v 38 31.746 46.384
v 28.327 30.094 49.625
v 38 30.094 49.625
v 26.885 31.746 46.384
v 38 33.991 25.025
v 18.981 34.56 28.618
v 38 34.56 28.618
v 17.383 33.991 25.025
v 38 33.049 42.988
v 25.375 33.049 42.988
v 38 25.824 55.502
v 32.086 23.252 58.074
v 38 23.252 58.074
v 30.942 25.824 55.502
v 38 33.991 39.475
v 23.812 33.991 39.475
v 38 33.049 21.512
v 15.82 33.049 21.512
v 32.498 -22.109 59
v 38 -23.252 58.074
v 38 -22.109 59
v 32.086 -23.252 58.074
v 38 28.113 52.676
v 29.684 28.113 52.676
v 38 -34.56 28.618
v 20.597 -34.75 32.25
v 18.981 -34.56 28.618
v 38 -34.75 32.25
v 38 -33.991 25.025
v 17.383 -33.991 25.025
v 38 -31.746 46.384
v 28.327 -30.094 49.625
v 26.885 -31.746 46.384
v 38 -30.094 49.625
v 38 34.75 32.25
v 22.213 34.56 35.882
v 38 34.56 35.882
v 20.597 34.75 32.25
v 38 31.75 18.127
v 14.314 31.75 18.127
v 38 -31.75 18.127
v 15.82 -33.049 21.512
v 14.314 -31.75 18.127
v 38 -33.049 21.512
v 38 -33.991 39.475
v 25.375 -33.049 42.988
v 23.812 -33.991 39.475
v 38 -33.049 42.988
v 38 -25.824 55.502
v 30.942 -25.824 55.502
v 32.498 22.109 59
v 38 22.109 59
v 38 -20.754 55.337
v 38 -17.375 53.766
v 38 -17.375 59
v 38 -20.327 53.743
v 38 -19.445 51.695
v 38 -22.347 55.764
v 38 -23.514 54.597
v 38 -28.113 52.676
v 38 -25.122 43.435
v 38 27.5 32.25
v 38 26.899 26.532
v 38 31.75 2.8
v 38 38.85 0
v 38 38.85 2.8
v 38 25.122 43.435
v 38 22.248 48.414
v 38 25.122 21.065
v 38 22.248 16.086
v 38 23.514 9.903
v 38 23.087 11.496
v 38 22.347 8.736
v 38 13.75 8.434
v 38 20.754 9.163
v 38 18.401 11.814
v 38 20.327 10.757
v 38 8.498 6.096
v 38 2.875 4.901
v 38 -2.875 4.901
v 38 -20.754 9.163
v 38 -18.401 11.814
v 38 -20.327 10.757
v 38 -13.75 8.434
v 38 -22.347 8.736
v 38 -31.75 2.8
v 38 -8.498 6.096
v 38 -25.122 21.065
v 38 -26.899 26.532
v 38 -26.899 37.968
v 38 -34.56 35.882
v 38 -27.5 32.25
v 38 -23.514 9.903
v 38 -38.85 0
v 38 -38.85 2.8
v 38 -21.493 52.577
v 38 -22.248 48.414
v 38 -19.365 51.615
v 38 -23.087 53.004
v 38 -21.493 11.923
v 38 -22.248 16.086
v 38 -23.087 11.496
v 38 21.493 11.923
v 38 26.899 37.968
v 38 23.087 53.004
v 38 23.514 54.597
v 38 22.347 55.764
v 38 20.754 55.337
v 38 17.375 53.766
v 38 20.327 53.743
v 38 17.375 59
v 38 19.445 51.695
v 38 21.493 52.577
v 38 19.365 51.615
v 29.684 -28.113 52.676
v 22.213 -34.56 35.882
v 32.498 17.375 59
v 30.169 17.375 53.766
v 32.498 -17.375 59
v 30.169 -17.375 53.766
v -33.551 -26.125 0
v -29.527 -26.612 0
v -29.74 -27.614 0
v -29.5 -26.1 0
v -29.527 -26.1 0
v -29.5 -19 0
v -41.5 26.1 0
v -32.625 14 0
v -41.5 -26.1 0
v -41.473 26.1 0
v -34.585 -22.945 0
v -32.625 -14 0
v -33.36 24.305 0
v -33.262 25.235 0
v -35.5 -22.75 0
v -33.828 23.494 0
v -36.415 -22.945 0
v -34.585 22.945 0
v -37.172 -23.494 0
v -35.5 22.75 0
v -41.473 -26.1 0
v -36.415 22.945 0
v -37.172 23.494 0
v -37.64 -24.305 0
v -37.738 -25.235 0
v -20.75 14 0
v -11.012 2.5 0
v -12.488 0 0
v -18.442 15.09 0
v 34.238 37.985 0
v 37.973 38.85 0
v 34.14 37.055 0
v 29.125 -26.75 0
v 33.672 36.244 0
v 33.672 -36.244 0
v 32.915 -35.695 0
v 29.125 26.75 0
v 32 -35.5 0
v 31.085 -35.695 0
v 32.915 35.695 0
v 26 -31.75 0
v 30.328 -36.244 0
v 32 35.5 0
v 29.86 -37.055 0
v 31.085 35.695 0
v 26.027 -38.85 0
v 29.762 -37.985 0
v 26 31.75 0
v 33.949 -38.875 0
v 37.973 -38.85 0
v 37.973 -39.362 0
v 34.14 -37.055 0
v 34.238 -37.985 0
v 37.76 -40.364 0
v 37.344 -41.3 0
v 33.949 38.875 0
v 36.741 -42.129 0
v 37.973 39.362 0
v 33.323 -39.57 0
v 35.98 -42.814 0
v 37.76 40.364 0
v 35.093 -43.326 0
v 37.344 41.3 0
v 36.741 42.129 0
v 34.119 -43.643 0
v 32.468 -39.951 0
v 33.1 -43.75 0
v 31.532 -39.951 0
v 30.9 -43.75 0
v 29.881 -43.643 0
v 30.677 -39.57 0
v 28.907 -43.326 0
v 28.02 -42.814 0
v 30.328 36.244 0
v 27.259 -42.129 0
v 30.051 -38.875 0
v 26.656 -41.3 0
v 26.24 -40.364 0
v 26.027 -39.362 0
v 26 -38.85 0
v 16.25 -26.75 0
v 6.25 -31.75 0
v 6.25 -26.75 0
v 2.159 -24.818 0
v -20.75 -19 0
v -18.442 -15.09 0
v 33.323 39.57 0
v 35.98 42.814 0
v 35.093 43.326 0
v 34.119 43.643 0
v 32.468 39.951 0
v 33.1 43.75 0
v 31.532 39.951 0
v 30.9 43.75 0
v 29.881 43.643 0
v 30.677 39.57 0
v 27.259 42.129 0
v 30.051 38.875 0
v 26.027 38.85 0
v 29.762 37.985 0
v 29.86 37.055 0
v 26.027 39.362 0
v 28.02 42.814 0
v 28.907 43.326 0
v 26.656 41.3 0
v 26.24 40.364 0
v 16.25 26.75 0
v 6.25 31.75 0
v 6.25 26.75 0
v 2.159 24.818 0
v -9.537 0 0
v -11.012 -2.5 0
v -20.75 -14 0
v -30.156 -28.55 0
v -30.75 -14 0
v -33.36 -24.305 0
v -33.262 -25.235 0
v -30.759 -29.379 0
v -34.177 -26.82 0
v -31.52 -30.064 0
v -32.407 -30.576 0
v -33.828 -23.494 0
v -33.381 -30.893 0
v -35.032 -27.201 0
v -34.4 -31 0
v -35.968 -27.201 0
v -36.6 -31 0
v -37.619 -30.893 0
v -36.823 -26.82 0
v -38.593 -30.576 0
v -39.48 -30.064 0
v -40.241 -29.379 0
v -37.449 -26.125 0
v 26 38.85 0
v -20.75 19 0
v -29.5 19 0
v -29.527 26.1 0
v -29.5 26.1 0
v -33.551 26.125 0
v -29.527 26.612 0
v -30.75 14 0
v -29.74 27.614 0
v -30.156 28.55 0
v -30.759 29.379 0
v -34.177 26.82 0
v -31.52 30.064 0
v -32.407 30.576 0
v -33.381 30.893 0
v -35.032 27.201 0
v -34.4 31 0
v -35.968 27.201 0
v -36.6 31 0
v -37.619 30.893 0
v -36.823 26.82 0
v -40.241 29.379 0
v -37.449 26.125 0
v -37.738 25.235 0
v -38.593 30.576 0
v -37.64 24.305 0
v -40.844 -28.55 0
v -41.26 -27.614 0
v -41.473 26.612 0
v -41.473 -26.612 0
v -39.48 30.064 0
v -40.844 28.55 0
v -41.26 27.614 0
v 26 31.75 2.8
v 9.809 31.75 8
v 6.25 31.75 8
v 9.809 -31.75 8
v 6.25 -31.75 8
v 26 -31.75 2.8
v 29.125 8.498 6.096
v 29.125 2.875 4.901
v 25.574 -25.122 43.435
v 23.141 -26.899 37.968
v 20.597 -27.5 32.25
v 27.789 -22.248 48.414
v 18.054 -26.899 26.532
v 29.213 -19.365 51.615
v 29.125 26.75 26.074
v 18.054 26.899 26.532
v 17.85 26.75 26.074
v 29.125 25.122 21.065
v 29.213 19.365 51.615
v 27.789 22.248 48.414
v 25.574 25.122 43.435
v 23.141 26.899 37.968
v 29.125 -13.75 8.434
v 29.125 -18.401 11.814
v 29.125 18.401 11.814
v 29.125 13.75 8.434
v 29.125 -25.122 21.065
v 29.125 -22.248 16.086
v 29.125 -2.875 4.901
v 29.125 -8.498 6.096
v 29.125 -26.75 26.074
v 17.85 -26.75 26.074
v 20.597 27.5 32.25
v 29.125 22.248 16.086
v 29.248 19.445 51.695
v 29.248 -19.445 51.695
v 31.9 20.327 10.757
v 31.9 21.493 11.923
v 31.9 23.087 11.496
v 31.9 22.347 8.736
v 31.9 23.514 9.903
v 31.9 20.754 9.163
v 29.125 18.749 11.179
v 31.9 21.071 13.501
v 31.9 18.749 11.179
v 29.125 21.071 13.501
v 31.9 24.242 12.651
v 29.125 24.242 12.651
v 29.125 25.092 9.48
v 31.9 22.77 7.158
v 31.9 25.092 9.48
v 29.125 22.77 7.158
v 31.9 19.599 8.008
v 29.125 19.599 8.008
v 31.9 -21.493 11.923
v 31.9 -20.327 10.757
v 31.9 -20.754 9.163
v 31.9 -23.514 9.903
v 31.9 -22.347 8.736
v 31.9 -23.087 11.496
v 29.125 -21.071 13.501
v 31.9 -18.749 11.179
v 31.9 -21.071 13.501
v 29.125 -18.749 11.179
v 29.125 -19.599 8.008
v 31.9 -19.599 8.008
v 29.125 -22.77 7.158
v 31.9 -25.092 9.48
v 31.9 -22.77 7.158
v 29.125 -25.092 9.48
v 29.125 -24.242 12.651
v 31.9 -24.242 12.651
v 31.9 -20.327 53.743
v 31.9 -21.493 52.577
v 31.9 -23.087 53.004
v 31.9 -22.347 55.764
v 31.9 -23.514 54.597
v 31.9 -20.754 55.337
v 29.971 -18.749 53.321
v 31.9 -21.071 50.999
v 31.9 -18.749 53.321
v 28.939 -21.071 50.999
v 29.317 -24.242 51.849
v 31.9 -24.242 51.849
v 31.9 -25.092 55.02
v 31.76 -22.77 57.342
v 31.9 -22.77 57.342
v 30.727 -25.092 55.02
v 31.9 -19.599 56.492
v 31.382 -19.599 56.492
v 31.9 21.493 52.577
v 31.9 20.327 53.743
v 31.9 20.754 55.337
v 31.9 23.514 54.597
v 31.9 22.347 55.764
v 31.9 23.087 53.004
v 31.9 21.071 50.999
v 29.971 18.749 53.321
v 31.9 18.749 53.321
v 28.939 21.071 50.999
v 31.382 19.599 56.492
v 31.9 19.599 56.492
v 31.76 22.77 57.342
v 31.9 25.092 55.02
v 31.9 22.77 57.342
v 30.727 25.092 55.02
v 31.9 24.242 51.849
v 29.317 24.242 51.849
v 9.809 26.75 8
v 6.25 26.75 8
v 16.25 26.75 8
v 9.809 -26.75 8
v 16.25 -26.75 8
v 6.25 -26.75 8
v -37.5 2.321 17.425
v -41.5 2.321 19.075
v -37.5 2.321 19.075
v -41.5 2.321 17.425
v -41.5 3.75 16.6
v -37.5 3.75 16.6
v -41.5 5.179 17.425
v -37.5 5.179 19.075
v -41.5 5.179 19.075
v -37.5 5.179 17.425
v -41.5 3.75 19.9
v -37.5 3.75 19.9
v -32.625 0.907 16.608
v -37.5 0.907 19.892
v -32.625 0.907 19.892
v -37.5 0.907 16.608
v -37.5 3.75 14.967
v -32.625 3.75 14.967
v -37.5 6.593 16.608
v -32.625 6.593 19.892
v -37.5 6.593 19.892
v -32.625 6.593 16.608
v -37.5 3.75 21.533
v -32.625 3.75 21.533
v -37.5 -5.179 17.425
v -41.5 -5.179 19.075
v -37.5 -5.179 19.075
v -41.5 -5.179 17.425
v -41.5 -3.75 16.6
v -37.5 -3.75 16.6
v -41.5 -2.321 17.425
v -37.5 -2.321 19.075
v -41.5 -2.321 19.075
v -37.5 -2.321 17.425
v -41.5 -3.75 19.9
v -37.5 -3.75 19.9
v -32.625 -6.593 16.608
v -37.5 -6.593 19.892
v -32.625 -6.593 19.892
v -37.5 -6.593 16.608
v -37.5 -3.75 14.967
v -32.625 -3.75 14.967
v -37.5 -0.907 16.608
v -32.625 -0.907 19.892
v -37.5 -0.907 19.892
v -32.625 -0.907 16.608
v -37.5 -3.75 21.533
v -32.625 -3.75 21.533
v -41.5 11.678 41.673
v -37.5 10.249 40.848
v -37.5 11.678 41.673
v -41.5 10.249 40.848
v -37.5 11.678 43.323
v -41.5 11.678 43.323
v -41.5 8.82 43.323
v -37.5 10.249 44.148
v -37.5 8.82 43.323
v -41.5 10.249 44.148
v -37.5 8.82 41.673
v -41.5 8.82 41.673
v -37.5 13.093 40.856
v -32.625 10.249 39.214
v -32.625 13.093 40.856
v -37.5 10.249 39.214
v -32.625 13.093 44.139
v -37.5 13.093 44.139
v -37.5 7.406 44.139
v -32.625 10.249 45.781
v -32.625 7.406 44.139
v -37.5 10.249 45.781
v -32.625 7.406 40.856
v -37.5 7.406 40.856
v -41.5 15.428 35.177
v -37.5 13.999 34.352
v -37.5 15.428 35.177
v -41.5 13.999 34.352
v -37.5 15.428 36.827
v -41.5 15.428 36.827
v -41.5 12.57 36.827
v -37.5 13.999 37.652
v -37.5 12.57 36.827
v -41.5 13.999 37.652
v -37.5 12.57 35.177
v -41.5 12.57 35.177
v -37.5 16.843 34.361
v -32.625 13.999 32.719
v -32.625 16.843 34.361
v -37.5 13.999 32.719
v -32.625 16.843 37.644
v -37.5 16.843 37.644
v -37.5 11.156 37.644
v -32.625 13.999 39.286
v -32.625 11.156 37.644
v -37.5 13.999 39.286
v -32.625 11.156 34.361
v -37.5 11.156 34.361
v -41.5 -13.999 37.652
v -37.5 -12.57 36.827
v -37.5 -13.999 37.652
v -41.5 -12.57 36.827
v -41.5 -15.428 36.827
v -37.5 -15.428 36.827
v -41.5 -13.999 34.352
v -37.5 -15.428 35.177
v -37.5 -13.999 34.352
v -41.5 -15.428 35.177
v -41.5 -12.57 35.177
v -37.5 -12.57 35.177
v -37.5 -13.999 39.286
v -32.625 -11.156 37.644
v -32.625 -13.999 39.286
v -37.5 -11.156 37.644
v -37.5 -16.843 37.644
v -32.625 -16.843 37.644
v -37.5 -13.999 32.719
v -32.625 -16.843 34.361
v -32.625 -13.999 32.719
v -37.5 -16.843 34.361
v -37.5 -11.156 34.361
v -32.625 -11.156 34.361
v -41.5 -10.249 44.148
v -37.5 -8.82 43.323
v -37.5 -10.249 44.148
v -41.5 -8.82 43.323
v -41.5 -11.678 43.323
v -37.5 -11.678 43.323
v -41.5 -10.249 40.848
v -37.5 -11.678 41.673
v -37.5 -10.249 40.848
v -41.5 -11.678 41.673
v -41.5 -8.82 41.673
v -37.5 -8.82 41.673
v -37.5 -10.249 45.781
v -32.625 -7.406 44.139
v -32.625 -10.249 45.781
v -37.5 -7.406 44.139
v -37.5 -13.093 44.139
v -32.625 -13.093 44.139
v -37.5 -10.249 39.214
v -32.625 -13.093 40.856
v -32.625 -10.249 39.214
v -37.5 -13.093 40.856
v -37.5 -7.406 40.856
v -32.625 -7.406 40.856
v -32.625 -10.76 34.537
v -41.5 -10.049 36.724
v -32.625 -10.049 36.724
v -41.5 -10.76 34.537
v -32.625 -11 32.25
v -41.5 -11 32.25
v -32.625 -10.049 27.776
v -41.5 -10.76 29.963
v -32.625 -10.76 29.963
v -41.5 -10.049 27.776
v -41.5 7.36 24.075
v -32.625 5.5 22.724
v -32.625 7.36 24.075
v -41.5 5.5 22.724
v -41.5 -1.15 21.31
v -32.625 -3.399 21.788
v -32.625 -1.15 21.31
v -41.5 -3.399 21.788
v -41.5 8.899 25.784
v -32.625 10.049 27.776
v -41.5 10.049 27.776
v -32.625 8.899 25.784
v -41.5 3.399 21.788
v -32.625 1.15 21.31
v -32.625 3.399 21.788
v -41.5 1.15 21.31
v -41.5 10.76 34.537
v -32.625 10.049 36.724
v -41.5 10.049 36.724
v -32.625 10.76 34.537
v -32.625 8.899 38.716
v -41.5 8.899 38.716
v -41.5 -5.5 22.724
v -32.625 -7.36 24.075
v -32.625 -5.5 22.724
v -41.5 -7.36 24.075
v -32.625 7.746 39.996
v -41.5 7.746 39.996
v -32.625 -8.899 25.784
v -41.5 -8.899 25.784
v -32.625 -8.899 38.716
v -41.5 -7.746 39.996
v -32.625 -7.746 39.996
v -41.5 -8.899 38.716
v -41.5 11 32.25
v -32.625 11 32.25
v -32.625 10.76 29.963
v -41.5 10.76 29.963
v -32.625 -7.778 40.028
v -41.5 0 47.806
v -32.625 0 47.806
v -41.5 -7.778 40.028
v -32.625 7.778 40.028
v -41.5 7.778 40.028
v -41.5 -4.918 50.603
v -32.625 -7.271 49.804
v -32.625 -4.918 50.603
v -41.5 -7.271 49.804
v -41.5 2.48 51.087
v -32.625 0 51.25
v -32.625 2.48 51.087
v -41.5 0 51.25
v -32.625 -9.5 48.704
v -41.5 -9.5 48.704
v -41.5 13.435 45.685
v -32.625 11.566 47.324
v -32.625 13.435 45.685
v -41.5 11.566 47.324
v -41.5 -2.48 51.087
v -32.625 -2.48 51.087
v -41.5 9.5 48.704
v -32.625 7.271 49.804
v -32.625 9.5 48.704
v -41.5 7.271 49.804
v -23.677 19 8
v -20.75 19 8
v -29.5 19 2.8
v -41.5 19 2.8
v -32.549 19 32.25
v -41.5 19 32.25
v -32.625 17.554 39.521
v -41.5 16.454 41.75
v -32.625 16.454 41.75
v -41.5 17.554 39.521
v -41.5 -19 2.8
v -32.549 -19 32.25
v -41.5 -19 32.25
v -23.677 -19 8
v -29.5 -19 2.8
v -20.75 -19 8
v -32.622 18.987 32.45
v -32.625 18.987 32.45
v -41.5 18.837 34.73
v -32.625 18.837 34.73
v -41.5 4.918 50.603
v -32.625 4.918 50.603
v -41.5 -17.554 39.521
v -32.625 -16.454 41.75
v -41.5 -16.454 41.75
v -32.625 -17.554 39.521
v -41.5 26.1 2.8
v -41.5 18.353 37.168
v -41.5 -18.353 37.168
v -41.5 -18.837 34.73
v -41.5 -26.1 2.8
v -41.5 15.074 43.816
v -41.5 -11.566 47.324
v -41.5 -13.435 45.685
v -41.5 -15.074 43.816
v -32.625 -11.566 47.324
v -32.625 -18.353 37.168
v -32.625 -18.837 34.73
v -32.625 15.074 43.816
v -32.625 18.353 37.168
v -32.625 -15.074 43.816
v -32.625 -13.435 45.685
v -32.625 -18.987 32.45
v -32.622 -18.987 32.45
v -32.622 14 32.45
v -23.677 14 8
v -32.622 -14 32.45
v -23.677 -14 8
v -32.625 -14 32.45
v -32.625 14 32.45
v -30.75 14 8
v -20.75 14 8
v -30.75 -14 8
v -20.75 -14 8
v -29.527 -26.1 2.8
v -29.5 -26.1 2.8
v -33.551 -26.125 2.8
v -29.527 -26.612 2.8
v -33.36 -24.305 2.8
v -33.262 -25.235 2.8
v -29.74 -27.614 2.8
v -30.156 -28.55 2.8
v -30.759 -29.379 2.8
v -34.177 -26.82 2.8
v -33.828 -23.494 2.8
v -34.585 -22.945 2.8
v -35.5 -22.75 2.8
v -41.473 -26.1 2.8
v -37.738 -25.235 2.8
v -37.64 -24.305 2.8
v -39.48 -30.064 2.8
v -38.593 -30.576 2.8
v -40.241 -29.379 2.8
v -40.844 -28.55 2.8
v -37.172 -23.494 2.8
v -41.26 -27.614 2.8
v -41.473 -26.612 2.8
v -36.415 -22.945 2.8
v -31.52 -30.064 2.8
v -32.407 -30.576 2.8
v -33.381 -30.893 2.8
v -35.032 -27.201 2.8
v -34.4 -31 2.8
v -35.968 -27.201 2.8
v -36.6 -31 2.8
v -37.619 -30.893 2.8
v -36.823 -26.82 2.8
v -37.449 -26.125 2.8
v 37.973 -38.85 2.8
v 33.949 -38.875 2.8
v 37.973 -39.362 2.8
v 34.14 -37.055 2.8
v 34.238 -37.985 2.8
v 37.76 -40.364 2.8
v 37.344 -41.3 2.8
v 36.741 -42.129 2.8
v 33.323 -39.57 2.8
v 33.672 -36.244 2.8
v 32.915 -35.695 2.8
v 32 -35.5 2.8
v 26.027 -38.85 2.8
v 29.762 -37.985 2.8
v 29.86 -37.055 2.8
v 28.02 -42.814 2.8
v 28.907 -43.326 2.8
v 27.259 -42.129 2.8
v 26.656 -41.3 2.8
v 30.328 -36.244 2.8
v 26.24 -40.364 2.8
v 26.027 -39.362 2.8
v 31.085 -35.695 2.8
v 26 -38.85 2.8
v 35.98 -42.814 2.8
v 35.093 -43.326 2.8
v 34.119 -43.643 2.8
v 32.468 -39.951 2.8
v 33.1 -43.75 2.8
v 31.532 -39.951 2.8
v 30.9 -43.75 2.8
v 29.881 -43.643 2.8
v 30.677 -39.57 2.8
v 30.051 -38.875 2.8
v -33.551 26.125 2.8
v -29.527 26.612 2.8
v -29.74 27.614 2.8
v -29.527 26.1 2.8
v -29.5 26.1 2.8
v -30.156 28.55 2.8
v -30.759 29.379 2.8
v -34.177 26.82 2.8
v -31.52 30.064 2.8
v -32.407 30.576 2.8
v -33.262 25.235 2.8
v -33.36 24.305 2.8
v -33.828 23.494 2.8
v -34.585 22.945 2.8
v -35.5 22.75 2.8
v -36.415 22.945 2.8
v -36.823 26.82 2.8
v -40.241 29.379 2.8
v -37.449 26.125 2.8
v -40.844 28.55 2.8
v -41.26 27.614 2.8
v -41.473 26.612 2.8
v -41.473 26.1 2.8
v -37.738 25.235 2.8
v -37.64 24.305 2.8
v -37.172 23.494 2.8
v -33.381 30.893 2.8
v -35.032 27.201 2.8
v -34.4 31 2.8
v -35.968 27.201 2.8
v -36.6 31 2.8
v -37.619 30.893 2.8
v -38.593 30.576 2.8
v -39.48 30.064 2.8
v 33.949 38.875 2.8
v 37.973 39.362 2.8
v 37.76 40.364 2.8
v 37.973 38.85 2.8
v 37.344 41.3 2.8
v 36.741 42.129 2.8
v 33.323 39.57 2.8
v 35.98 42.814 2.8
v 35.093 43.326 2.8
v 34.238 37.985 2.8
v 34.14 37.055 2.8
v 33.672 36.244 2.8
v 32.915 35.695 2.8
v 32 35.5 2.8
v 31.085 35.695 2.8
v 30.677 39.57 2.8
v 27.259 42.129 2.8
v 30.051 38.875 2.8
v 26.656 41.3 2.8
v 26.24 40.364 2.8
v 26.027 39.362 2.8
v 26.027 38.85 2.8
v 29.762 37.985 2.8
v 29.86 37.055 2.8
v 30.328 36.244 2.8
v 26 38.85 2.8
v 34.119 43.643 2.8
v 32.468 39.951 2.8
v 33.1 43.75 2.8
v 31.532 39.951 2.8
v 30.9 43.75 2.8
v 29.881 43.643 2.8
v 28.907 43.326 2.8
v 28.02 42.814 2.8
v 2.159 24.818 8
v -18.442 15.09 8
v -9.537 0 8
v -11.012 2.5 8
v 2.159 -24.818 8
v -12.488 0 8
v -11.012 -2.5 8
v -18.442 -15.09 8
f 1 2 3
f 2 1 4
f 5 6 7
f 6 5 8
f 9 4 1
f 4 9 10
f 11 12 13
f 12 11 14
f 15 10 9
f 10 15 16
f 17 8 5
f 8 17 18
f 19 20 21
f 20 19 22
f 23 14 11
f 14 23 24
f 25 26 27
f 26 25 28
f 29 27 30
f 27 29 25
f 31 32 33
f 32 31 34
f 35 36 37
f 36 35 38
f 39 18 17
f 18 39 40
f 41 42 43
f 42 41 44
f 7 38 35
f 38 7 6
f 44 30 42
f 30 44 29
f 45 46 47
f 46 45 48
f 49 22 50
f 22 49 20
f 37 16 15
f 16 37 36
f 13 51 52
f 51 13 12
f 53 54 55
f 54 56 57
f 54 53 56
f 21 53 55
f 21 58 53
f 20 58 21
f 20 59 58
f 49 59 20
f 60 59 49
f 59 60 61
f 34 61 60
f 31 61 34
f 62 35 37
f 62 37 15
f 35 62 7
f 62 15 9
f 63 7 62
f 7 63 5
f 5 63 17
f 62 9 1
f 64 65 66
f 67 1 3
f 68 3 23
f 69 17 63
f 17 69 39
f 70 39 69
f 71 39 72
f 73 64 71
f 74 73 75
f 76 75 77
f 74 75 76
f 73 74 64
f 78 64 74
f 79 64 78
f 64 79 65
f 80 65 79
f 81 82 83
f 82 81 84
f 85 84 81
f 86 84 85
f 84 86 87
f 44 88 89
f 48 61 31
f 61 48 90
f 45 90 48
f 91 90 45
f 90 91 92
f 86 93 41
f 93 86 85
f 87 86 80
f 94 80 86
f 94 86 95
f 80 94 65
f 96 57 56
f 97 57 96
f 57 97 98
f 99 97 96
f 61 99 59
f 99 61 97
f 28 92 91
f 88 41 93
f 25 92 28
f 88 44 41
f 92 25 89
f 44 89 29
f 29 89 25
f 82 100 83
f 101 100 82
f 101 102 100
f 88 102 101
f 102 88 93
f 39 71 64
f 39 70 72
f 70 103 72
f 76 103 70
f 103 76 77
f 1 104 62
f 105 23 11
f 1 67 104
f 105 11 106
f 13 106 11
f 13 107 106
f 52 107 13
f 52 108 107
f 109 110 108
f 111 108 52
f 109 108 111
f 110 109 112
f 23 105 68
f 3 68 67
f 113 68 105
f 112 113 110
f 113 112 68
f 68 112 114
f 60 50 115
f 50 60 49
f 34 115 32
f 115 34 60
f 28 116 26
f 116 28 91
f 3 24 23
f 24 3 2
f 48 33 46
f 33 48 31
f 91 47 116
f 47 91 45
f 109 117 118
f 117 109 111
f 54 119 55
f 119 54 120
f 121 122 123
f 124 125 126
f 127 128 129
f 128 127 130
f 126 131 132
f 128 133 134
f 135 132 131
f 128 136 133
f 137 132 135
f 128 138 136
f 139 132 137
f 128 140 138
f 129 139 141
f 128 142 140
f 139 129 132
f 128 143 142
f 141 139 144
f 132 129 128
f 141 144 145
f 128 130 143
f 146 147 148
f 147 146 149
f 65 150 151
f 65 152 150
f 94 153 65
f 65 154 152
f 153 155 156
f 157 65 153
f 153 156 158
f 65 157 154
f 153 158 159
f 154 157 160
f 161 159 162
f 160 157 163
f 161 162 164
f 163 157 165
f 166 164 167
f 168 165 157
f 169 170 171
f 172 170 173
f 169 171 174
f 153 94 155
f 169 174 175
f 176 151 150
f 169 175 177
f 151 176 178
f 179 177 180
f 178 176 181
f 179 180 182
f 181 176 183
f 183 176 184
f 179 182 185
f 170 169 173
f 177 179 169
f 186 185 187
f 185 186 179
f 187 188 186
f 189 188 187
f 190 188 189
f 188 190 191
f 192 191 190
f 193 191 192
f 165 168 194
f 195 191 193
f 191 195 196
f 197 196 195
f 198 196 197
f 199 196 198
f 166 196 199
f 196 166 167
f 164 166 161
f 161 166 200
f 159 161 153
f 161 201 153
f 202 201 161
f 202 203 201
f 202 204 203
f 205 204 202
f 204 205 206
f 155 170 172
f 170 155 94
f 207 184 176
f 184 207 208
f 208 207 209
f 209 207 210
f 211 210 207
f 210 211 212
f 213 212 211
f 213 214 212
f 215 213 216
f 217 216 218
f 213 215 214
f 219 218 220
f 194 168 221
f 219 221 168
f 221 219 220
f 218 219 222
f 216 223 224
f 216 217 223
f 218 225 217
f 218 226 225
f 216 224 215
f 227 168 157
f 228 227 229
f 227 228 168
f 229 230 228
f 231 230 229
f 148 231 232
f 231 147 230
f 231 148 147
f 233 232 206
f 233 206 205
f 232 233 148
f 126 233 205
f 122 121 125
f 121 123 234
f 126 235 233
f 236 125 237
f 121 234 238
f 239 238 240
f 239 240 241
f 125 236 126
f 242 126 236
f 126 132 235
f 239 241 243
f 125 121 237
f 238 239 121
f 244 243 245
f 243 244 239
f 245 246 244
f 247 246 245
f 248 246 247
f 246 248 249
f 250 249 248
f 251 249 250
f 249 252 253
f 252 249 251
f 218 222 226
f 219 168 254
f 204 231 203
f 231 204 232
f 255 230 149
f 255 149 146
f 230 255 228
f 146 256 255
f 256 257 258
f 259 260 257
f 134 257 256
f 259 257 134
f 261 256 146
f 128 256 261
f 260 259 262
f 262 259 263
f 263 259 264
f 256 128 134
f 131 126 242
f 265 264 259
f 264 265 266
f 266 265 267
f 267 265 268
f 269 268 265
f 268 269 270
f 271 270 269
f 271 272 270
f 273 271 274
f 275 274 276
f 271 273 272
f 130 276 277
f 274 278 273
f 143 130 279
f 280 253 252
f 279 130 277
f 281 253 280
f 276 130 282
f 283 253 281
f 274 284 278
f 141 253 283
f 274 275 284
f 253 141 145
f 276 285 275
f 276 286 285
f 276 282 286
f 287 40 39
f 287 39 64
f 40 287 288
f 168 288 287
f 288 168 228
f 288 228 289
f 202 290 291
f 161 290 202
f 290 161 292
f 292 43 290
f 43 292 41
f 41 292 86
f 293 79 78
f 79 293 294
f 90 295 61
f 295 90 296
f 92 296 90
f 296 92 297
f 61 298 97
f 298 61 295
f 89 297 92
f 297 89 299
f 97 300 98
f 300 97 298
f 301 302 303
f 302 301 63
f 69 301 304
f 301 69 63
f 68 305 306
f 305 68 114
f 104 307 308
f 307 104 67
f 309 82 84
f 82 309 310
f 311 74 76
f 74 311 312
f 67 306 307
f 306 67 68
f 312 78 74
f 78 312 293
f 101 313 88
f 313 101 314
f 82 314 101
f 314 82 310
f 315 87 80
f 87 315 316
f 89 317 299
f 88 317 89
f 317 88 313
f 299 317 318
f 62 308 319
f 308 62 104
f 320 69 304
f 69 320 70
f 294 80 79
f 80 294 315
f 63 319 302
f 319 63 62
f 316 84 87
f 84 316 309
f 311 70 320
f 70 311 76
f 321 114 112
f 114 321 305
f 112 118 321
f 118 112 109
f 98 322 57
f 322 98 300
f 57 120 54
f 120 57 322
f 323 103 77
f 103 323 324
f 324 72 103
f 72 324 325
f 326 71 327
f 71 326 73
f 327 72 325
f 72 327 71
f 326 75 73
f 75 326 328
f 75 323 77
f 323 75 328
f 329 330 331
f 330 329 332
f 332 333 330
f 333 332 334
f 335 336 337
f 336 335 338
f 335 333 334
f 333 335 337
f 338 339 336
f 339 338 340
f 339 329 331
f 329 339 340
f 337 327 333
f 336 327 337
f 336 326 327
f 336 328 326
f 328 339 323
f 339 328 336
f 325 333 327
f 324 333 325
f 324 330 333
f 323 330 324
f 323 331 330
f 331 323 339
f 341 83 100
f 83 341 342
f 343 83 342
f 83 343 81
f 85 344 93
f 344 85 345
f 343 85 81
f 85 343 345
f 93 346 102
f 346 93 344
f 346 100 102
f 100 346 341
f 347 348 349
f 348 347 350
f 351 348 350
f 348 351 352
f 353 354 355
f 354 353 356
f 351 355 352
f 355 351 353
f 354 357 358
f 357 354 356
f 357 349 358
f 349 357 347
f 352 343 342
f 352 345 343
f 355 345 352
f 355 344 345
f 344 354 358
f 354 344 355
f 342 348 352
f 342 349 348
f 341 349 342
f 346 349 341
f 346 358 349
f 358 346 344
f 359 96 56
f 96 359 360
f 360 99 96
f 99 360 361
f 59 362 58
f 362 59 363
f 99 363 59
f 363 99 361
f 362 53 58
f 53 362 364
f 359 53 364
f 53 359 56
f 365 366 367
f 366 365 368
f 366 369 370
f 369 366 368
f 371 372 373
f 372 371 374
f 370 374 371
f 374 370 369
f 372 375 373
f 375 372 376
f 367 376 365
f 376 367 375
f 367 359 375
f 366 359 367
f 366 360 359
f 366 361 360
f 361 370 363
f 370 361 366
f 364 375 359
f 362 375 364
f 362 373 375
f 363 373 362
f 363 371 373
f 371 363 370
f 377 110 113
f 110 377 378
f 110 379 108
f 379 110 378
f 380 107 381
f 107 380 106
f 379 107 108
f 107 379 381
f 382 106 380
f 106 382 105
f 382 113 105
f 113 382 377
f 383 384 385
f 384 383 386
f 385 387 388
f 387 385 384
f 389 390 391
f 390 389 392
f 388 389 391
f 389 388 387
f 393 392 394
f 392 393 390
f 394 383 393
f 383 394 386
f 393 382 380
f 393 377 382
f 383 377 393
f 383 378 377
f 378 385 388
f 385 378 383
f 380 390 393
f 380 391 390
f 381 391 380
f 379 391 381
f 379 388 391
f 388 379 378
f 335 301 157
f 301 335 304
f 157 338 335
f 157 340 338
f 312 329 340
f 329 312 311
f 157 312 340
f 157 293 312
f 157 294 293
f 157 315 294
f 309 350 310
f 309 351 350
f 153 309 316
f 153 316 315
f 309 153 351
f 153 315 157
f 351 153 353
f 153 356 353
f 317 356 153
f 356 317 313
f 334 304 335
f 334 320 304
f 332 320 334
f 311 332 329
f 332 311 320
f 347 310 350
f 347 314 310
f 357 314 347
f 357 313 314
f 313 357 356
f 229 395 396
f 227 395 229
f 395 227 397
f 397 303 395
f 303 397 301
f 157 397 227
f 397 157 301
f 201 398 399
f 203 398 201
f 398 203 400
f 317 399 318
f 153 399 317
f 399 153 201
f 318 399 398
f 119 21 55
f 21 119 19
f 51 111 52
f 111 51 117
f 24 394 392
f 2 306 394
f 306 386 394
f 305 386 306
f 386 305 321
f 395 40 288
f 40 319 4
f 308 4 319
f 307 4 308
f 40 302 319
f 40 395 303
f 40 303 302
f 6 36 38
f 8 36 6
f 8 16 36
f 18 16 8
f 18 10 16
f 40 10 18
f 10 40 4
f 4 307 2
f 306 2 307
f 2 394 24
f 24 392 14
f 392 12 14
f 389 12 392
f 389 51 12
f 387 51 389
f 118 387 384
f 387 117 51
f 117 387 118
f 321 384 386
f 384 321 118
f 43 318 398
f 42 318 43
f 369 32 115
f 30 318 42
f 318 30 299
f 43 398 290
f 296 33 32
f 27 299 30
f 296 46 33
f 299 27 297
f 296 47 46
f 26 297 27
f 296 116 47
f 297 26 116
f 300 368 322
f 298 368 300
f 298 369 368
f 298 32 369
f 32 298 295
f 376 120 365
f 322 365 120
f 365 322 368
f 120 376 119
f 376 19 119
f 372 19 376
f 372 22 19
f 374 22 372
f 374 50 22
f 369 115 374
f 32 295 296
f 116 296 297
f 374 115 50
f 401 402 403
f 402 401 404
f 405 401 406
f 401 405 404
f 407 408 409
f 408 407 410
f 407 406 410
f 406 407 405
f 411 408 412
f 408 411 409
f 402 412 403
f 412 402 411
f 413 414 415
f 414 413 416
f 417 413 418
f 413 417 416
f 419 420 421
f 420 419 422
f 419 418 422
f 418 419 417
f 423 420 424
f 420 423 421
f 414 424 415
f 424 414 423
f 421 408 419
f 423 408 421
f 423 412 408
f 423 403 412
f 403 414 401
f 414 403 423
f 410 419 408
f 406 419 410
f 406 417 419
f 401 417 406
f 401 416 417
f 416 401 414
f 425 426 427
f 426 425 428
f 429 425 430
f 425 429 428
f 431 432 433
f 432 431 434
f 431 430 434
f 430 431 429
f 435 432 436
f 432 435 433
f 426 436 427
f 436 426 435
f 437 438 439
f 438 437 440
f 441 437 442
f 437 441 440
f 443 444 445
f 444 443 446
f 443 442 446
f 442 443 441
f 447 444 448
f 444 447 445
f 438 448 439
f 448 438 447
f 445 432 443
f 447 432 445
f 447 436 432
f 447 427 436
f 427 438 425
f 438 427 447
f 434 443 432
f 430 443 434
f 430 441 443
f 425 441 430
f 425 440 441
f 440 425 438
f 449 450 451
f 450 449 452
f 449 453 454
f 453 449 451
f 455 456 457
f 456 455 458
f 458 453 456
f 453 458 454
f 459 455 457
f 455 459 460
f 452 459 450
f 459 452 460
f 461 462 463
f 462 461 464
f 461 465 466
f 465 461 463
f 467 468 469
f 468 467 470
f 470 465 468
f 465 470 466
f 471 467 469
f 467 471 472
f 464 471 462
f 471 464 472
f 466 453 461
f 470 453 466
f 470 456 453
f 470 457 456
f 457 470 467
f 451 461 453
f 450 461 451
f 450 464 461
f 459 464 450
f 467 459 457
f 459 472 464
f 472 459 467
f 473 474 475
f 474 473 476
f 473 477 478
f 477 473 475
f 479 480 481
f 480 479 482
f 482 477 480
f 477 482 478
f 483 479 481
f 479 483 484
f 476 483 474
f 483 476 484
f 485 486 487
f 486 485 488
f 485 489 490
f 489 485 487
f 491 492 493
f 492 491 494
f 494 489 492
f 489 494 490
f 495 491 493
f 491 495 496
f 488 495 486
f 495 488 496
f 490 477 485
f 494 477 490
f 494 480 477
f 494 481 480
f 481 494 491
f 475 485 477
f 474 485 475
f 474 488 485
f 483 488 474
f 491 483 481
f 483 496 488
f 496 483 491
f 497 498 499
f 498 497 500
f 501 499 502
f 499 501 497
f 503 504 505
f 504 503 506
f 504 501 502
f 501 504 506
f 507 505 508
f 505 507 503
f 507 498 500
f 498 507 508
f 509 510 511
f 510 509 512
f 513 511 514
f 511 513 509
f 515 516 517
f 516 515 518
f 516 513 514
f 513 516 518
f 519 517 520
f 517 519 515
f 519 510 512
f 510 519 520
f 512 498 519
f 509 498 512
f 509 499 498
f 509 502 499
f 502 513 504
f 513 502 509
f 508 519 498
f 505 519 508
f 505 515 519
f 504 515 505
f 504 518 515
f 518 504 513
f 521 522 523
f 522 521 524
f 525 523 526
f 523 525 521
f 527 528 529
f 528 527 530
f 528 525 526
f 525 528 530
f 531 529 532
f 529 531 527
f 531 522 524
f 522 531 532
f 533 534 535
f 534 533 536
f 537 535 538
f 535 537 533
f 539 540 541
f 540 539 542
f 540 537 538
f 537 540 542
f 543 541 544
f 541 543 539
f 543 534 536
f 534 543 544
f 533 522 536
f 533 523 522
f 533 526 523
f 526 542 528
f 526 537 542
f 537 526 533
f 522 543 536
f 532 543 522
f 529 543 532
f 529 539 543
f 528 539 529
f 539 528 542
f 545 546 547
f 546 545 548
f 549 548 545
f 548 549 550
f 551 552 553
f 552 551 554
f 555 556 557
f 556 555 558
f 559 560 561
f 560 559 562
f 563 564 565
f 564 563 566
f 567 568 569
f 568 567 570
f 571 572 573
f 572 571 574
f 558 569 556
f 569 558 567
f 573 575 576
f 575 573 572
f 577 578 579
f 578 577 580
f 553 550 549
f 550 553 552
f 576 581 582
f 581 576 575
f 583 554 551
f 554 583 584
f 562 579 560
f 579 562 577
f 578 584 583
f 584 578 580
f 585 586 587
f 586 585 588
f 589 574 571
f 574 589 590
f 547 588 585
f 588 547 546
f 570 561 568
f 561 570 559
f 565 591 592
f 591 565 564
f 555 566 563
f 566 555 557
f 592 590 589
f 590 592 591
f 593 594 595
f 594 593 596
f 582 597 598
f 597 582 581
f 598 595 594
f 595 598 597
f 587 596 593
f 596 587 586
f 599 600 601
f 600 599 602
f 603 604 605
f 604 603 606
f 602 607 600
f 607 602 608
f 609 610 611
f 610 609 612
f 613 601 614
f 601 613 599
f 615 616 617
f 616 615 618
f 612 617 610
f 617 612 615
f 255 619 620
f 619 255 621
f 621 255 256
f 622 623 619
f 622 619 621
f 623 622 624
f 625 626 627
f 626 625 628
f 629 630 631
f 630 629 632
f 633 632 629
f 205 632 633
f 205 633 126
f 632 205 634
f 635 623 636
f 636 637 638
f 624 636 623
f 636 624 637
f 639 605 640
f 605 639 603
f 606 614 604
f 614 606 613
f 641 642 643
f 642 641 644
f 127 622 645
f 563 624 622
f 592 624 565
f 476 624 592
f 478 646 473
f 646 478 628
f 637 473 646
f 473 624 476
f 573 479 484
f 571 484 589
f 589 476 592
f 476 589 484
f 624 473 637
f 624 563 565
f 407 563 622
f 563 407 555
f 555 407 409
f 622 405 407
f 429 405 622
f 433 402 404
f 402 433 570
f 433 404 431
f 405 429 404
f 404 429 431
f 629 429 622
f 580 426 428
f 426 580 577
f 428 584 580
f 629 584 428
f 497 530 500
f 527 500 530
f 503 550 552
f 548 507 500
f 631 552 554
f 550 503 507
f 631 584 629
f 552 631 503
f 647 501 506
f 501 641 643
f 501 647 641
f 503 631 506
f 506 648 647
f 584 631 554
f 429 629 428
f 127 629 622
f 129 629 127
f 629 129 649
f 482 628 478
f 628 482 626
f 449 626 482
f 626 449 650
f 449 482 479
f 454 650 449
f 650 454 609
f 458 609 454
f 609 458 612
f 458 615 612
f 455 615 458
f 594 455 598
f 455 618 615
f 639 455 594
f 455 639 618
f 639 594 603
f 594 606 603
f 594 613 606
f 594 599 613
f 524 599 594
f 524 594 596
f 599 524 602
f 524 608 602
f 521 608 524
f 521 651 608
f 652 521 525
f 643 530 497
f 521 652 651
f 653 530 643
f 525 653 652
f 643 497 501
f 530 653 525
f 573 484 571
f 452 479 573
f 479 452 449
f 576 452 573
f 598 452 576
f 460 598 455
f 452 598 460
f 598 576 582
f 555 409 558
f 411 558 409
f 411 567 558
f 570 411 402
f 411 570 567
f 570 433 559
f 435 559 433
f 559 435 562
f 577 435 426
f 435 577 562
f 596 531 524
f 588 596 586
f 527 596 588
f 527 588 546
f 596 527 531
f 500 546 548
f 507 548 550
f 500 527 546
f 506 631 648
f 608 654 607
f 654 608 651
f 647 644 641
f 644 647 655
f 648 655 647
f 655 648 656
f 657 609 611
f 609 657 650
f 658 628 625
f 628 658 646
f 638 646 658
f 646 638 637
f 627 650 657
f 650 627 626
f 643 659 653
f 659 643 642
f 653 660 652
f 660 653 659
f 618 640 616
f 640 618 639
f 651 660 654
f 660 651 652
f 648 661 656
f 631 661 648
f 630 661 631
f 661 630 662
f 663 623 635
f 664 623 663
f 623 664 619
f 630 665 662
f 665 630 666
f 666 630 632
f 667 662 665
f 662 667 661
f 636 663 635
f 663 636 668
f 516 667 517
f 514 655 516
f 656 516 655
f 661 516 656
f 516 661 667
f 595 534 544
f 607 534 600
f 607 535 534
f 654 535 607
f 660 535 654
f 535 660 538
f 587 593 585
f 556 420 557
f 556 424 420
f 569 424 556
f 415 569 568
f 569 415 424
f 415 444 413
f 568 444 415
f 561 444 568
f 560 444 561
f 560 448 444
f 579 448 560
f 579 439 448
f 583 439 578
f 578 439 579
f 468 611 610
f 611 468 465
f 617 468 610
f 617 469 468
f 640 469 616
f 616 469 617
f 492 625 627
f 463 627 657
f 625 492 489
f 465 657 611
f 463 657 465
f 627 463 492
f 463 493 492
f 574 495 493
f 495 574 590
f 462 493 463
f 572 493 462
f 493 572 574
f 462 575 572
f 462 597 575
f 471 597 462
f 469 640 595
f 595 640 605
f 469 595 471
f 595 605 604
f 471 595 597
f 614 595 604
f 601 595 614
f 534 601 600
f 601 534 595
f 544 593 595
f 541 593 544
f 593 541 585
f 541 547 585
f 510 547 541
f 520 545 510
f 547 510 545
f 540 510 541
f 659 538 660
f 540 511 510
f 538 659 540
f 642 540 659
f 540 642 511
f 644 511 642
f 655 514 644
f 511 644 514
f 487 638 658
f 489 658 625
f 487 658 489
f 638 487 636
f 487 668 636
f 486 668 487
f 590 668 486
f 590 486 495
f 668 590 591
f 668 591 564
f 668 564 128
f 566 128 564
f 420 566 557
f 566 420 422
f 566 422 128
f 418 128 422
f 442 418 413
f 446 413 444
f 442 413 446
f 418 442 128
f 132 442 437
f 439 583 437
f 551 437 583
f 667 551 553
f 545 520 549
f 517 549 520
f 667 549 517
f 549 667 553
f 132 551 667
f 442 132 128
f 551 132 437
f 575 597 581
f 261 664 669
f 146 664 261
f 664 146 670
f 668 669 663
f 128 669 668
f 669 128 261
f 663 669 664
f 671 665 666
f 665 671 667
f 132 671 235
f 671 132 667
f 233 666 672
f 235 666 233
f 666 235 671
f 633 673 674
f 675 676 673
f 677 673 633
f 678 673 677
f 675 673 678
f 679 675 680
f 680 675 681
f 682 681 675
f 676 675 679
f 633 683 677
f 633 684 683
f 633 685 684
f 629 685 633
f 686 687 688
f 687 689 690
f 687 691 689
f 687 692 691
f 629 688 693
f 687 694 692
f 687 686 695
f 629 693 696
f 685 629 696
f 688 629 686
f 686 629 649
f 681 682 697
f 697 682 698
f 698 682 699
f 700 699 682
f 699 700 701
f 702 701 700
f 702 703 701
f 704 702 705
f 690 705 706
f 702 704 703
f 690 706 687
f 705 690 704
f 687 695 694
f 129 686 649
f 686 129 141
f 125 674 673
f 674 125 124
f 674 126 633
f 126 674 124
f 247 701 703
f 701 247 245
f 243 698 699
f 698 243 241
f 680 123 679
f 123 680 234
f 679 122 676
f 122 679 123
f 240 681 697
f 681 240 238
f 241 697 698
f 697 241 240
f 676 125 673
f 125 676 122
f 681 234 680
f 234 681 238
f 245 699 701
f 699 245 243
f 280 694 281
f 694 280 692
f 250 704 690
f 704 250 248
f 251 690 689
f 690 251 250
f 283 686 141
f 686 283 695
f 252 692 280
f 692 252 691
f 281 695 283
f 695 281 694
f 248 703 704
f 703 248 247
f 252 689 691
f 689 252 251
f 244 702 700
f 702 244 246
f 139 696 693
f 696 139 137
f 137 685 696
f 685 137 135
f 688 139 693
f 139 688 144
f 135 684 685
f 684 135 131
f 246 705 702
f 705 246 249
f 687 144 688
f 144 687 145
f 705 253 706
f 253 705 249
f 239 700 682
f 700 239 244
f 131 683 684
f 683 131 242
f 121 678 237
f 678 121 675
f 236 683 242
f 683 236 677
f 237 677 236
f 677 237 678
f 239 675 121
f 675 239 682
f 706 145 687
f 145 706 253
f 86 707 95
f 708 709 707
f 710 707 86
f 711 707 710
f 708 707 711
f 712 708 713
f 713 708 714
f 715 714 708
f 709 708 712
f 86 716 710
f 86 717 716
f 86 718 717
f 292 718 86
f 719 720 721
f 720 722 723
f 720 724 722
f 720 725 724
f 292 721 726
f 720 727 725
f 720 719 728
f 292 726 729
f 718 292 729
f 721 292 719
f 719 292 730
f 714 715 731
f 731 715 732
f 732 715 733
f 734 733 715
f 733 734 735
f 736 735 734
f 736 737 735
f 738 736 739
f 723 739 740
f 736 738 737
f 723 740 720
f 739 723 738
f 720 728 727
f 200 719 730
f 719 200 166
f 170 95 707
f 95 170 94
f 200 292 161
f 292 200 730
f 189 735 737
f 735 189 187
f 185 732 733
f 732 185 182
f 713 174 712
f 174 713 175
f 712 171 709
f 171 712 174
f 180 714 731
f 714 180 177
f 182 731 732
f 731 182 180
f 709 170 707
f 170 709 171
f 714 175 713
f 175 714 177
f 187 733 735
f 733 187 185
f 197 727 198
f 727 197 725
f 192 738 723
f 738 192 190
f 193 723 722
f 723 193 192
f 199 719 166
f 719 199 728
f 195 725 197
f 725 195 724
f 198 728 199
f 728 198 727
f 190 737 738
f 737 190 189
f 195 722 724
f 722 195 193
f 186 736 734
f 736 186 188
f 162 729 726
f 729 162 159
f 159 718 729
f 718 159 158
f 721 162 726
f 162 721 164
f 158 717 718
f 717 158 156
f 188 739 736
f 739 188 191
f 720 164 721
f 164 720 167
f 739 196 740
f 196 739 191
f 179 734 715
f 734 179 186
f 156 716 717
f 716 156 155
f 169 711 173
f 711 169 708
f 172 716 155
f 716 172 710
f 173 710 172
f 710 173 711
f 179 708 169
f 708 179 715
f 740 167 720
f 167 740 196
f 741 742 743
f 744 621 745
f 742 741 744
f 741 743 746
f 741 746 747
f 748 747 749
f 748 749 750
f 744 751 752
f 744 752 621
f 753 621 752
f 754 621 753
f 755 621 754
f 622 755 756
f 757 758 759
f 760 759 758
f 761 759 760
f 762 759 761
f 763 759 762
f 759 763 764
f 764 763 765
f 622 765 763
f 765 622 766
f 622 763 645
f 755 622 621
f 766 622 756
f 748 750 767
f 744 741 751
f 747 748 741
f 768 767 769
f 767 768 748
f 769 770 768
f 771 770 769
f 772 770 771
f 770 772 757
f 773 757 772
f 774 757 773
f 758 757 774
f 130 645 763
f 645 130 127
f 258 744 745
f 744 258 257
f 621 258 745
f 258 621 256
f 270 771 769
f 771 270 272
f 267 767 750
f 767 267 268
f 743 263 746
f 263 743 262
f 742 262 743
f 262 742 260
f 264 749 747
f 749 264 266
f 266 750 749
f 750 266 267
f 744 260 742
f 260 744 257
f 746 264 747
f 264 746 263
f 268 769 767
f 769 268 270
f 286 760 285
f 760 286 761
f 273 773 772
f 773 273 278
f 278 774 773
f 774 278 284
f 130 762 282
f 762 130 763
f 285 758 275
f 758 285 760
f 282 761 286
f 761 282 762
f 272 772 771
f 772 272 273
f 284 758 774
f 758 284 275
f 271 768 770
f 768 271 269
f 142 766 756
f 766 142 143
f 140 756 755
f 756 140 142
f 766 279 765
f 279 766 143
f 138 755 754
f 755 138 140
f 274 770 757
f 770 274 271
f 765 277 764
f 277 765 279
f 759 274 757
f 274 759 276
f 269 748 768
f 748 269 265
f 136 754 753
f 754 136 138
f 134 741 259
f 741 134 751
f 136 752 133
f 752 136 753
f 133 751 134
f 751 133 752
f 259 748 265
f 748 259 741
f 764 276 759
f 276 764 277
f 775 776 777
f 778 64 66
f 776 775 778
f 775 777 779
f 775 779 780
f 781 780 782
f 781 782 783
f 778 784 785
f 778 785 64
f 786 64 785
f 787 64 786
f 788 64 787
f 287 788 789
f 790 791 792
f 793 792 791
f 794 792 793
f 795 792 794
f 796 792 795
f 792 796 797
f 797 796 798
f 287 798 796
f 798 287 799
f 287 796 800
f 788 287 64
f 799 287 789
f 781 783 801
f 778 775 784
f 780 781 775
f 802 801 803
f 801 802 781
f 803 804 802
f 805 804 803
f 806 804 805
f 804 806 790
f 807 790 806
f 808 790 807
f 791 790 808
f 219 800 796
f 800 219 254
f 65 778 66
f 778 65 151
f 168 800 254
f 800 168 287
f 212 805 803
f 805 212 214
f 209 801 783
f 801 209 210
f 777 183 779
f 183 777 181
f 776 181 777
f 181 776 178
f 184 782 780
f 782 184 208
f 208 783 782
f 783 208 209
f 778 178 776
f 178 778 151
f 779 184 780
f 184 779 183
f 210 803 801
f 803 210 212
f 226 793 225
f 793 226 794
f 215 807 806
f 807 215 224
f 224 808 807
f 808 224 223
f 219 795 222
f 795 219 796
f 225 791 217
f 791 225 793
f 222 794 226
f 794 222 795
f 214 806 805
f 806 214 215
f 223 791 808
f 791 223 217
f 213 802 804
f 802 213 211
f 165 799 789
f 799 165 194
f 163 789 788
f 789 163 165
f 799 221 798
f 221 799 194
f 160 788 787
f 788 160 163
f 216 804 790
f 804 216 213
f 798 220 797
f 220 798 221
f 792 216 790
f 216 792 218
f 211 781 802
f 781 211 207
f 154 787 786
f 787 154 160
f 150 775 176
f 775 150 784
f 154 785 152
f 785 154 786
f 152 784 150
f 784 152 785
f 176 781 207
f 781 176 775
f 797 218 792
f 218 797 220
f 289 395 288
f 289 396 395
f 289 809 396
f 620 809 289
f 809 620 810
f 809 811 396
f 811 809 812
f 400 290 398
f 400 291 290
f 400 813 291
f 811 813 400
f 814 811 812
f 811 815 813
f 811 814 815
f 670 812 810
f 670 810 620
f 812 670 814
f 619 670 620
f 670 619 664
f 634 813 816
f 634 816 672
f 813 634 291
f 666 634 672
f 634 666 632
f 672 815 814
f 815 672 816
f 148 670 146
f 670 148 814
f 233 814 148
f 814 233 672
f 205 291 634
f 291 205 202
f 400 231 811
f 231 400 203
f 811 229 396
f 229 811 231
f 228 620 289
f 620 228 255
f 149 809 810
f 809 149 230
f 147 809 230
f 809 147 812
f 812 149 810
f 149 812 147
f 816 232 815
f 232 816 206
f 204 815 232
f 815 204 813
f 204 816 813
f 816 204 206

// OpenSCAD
// file: parameters.scad
// Parameters shared between modules
Base_th = 2.8;
Beam_width = 15;
Wiggle = 0.25;
Fat_beam_width = Beam_width + Wiggle;
Beam_length = 400;
Wall_th = 2.5;
Min_beam_width = 12.5;
Max_beam_width = 17.5;
Zip_th = 2;
Zip_h = Zip_th + Max_beam_width - Min_beam_width;
Zip_w = 5.0;
Nema17_cube_width          = 42.43;
Nema17_screw_hole_width    = 43.74; // Opposite corner screws
Nema17_ring_diameter       = 22;
Nema17_cube_height         = 39.36;
Nema17_shaft_height        = 63.65;
Nema17_ring_height         = 2;
Nema17_shaft_radius        = 5/2;
b608_outer_dia = 22.2;
b608_width = 7.05;
Gap_between_sandwich_and_plate = 1.5 + Base_th; // 1.5 mm for wiggle
Motor_bracket_flerp_r = 6;
Motor_bracket_flerp = 14;
Motor_bracket_cw = Nema17_cube_width + 6;
Motor_bracket_att_ang = 50;
Mounting_screw_d = 4.5;
Mounting_screw_head_d = 14;
Spool_outer_wall_th = 4;

// Corner clamp parameters
Cc_l1 = (Fat_beam_width+2*Wall_th)*2*sqrt(3);
Cc_rad_b = 4;
Cc_action_point_from_mid = Cc_l1/sqrt(3)-2*Cc_rad_b-1.3;  // 1.3 chosen arbitrarily
Cc_plastic_length = sqrt(Cc_action_point_from_mid*Cc_action_point_from_mid
                       - (Cc_action_point_from_mid/2)*(Cc_action_point_from_mid/2));

// The distance between the two action points on the mover
Sidelength = Beam_length + 2*Cc_plastic_length;

/////// Layout parameters ////////////
Ext_sidelength = Sidelength+77;
Additional_added_plate_side_length = 10;
Yshift_top_plate = -25;

/////// Gear parameters ////////////
Circular_pitch = 262;
Motor_teeth = 10;
Gear_height = 21.4-3;
Motor_pitch                      = (Motor_teeth*Circular_pitch/360);
Motor_pitch_diametrial           = Motor_teeth/(2*Motor_pitch);
Motor_outer_radius               = Motor_pitch + 1/Motor_pitch_diametrial;
Spool_teeth = 100;
Spool_r = 55;
Spool_height = 8;
Spool_pitch                      = (Spool_teeth*Circular_pitch/360);
Spool_pitch_diametrial           = Spool_teeth/(2*Spool_pitch);
Spool_outer_radius               = Spool_pitch + 1/Spool_pitch_diametrial;
Torx_depth = 5;
Motor_bracket_depth = Gear_height+1+7+Nema17_ring_height+1+Gap_between_sandwich_and_plate;
Spool_core_flerp0 = 16+3;

/////// Lineroller parameters ////////////
b623_width  = 4;
b623_bore_r = 3/2;
b623_vgroove_big_r = 12/2;
b623_vgroove_small_r = 10/2;
Lineroller_wall_th = 2.3;


// The height that lineroller_ABC_winch will have if we include the bearing
Tower_h = Gap_between_sandwich_and_plate+Gear_height
         + Spool_height/2
         + b623_vgroove_small_r
         + b623_vgroove_big_r;
Bearing_wall = 1;
Depth_of_lineroller_tower = b623_width + 2*Wall_th; // 9
Depth_of_lineroller_base = Depth_of_lineroller_tower + 9; // 18
Ptfe_r = 2.1;
Lineroller_base_r = Depth_of_lineroller_base/2-1*(Ptfe_r+2);
Screw_h = 2;
Screw_head_h = 2;
Spool_center_bearing_wall_th = 5;
Idler_block_bearing_center_to_center = 15;

//// Lineroller anchor parameters /////

Bearing_0_x = 2*b623_vgroove_big_r+Bearing_wall+5.3;
Bearing_1_x = b623_vgroove_small_r-0.9;
Move_tower = -12.2;
Lower_bearing_z = 13;
Higher_bearing_z = Lower_bearing_z + Idler_block_bearing_center_to_center;


//// Donkey and encoder parameters /////

Donkey_shaft_d = 6;
Donkey_h = 65.12;
Donkey_body_d = 50;
Donkey_feet_th = 3.5;

Encoder_LDP3806_shaft_d = 6;
Encoder_LDP3806_d = 38;


//// Cable Clamp parameters /////

Bit_width = 12;
Cable_r=2.5;
// file: donkey.scad
use <util.scad>
include <parameters.scad>

module encoder_screw_hole_translate(twist=0){
  rotate([0,0,twist])
    for(rot=[0:120:359])
      rotate([0,0,rot])
        for(k=[1,-1])
          translate([14, k*7.5/2, 34 - 10])
            children();
}

module encoder_screw_holes(h = 11){
  encoder_screw_hole_translate()
    cylinder(d=3, h=h); // screw holes
}

module donkey_screw_hole_translate(){
  for(rot=[0:90:359])
    rotate([0,0,rot])
      translate([0,56/2 + 6/2,-1])
        children();
}

module donkey_screw_holes(){
  donkey_screw_hole_translate()
    rotate([0,0,90]) // center these round ends...
    translate([-3, -4.5/2, 0])
    round_ends([6, 4.5, 3.5 + 2], $fn=14);
}

//donkey();
module donkey(){
  difference(){
    cylinder(d = 73,h = 12);
    translate([0,0,Donkey_feet_th])
    rotate_extrude()
      translate([73/2-9.6,0])
      square(12);
    for(rot=[0:90:359])
      rotate([0,0,rot]){
        translate([5,5,-1])
          rounded_cube2([73,73,12+2], 10, $fn=4*7);
      }
    donkey_screw_holes();
    translate([0,0,-1])
      cylinder(d = 46, h = 8.7 + 1);
  }
  translate([0, 0, 13.3]){
    color("dimgray"){
      cylinder(d = Donkey_body_d, h = 23);
      cylinder(d = 18, h = 23 + 5.6);
    }
    cylinder(d = Donkey_shaft_d, h = 23 + 5.6 + 23.22);
  }
}
// main file
use <util.scad>
use <donkey.scad>
include <parameters.scad>

d = 11;
tail = 5; // behind donkey available th = d/2 + tail
donkey_feet_w = 43.5;
encoder_feet_w = 29;
hole_to_hole_l = 83.0;
th = 2;
elevate_donkey_screw_holes = th + 8.5;
shaft_mid_h = donkey_feet_w/2 + elevate_donkey_screw_holes;

//to_be_mounted();
module to_be_mounted(){
  translate([hole_to_hole_l/2, 0, shaft_mid_h])
    rotate([0,-90,0])
    rotate([0,0,45])
    import("../openscad_stl/donkey.stl");
    //donkey();

  translate([-hole_to_hole_l/2, 0, shaft_mid_h])
    rotate([0,90,0])
    rotate([0,0,45])
    translate([0,0,-34])
    import("../openscad_stl/donkey_encoder.stl");
    //donkey();
}


box_depth_donkey = hole_to_hole_l/4+11;
box_depth_encoder = hole_to_hole_l/4;

donkey_face();
module donkey_face(){
  tr_x = (hole_to_hole_l/2 - box_depth_donkey) - Donkey_feet_th;
  difference(){
    union(){
      translate([tr_x, -(donkey_feet_w+20)/2, 0]){
        cube([box_depth_donkey,
              donkey_feet_w + 20,
              elevate_donkey_screw_holes + donkey_feet_w + -14.2]);
              //elevate_donkey_screw_holes + donkey_feet_w + 7.2]);
        translate([0,(donkey_feet_w + 20)/2, shaft_mid_h])
          rotate([0,90,0])
          difference(){
            cylinder(r=(donkey_feet_w + 20)/2 + 3, h = box_depth_donkey, $fn=60);
            cube([donkey_feet_w + 20 + 10 + 1,
                 (donkey_feet_w + 20)/2 + 3,
                 2*box_depth_donkey + 2], center=true);
          }
      }
    }
    translate([tr_x - box_depth_encoder/2+1.5, -(donkey_feet_w + 20 - 10)/2, -1])
      cube([box_depth_donkey, donkey_feet_w + 20 - 10, shaft_mid_h]);
    translate([0,-50,shaft_mid_h + donkey_feet_w/2 + 5])
      cube(100);
    translate([hole_to_hole_l/2, 0, shaft_mid_h])
      rotate([0,-90,0])
      rotate([0,0,-90])
      teardrop(r=(Donkey_body_d + 5)/2, h=100);
    translate([0, -(Donkey_body_d - 19)/2, Donkey_body_d/2])
      cube([100, Donkey_body_d - 19, Donkey_body_d*2]); // Further opens teardrop opening
    translate([(hole_to_hole_l/2 - box_depth_donkey) - Donkey_feet_th,0,0])
      rotate([0,90-atan((donkey_feet_w + 20)/(box_depth_donkey - Donkey_feet_th)), 0])
      translate([-hole_to_hole_l, -(donkey_feet_w + 50)/2, 0])
      cube([hole_to_hole_l, donkey_feet_w + 50, 100]); // Makes the slant
    translate([hole_to_hole_l/2,0,donkey_feet_w/2 + elevate_donkey_screw_holes])
      rotate([0,-90,0])
      rotate([0,0,45])
      donkey_screw_hole_translate(){
        cylinder(d=3.3, h=40); // screw
        translate([0,0,Donkey_feet_th+1 + 6.1])
          cylinder(d=5.6/cos(30) + 0.1, h=40, $fn=6); // put nut in
      }
  }
}


encoder_face();
module encoder_face(){
  the_height = shaft_mid_h + Encoder_LDP3806_d/2;
  difference(){
    translate([-hole_to_hole_l/2, -Encoder_LDP3806_d/2, 0])
      translate([box_depth_encoder,0,0])
      rotate([0,-90,0])
      round_end([the_height, Encoder_LDP3806_d, box_depth_encoder], $fn=12*4);
    translate([-hole_to_hole_l/2 + box_depth_encoder,0,0])
      rotate([0,-90+atan(the_height/(box_depth_encoder - th)),0])
      translate([0,-(Encoder_LDP3806_d + 2)/2, 0])
      cube([hole_to_hole_l, Encoder_LDP3806_d + 2, 34.56]); // the slant

    translate([-hole_to_hole_l/2 + box_depth_encoder/2 - 1.5,0,32.45])
      translate([0,-(Encoder_LDP3806_d + 2)/2, 0])
      cube([hole_to_hole_l, Encoder_LDP3806_d + 2, 50]); // the slant
    translate([-hole_to_hole_l/2+ 10, 0, shaft_mid_h])
      rotate([0,90,0])
      rotate([0,0,45])
      encoder_screw_hole_translate(-45){
        translate([0,0,-34]){
          translate([0,0,-1])
            cylinder(d=3.3, h=40); // screw
          translate([0,0,4.0])
            cylinder(d=5.6/cos(30) + 0.1, h=40, $fn=6); // Put nut in
        }
      }
    translate([0,0,shaft_mid_h])
      rotate([0,-90,0])
        rotate([0,0,-90]){
          teardrop(r=11, h=50);
        }
    translate([-hole_to_hole_l/2 + box_depth_encoder/2 -1.5, -28/2, -1])
      cube([box_depth_encoder, 28, the_height]);
  }
}

plate();
module plate(){
  a = hole_to_hole_l/2;
  b = box_depth_encoder;
  c = box_depth_donkey;
  d = (donkey_feet_w + 20)/2;
  e = a - Donkey_feet_th;
  f = 5;
  linear_extrude(height=8, convexity=10)
    for(k=[0,1])
      mirror([0,k,0]){
        polygon(points = [
                          [-a+b, -Encoder_LDP3806_d/2],
                          [-a+b-10, -Encoder_LDP3806_d/2],
                          [-a+b-10, -Encoder_LDP3806_d/2 + f],
                          [-a+b, -Encoder_LDP3806_d/2 + f],
                          [ e-c, -d + f],
                          [ e-c+10, -d + f],
                          [ e-c+10, -d],
                          [ e-c, -d],
                         ]);
        polygon(points = [
                          [-a+b, -Encoder_LDP3806_d/2],
                          [-a+b-10, -Encoder_LDP3806_d/2],
                          [-a+b-10, -Encoder_LDP3806_d/2 + f],
                          [-a+b, -Encoder_LDP3806_d/2 + f],
                          [ e-c, d],
                          [ e-c+10, d],
                          [ e-c+10, d-f],
                          [ e-c, d-f],
                         ]);
      }
  //polygon(points = [
  //                  [-a+b, -Encoder_LDP3806_d/2],
  //                  [-a,   -Encoder_LDP3806_d/2],
  //                  [-a,    Encoder_LDP3806_d/2],
  //                  [-a+b,  Encoder_LDP3806_d/2],
  //                  [ e-c,  d],
  //                  [ e  ,  d],
  //                  [ e  , -d],
  //                  [ e-c, -d]
  //                 ]);
  module bit(){
    rotate([0,0,90])
    translate([-Bit_width/2, -Bit_width/2, 0])
    difference(){
      left_rounded_cube2([Bit_width+4,Bit_width,Base_th], Lineroller_base_r);
      translate([Bit_width/2, Bit_width/2, -1])
        cylinder(d=Mounting_screw_d, h=Base_th+2, $fs=1);
    }
  }
  for(k=[0,1])
    mirror([0,k,0]){
      translate([-hole_to_hole_l/2+Bit_width/2,
                 -Encoder_LDP3806_d/2-Bit_width/2,
                 0])
        bit(); // Wood screw holes encoder
      translate([hole_to_hole_l/2 - Donkey_feet_th - Bit_width/2,
                 -(donkey_feet_w + 20)/2 - Bit_width/2,
                 0])
        bit(); // Wood screw holes donkey
    }
}
